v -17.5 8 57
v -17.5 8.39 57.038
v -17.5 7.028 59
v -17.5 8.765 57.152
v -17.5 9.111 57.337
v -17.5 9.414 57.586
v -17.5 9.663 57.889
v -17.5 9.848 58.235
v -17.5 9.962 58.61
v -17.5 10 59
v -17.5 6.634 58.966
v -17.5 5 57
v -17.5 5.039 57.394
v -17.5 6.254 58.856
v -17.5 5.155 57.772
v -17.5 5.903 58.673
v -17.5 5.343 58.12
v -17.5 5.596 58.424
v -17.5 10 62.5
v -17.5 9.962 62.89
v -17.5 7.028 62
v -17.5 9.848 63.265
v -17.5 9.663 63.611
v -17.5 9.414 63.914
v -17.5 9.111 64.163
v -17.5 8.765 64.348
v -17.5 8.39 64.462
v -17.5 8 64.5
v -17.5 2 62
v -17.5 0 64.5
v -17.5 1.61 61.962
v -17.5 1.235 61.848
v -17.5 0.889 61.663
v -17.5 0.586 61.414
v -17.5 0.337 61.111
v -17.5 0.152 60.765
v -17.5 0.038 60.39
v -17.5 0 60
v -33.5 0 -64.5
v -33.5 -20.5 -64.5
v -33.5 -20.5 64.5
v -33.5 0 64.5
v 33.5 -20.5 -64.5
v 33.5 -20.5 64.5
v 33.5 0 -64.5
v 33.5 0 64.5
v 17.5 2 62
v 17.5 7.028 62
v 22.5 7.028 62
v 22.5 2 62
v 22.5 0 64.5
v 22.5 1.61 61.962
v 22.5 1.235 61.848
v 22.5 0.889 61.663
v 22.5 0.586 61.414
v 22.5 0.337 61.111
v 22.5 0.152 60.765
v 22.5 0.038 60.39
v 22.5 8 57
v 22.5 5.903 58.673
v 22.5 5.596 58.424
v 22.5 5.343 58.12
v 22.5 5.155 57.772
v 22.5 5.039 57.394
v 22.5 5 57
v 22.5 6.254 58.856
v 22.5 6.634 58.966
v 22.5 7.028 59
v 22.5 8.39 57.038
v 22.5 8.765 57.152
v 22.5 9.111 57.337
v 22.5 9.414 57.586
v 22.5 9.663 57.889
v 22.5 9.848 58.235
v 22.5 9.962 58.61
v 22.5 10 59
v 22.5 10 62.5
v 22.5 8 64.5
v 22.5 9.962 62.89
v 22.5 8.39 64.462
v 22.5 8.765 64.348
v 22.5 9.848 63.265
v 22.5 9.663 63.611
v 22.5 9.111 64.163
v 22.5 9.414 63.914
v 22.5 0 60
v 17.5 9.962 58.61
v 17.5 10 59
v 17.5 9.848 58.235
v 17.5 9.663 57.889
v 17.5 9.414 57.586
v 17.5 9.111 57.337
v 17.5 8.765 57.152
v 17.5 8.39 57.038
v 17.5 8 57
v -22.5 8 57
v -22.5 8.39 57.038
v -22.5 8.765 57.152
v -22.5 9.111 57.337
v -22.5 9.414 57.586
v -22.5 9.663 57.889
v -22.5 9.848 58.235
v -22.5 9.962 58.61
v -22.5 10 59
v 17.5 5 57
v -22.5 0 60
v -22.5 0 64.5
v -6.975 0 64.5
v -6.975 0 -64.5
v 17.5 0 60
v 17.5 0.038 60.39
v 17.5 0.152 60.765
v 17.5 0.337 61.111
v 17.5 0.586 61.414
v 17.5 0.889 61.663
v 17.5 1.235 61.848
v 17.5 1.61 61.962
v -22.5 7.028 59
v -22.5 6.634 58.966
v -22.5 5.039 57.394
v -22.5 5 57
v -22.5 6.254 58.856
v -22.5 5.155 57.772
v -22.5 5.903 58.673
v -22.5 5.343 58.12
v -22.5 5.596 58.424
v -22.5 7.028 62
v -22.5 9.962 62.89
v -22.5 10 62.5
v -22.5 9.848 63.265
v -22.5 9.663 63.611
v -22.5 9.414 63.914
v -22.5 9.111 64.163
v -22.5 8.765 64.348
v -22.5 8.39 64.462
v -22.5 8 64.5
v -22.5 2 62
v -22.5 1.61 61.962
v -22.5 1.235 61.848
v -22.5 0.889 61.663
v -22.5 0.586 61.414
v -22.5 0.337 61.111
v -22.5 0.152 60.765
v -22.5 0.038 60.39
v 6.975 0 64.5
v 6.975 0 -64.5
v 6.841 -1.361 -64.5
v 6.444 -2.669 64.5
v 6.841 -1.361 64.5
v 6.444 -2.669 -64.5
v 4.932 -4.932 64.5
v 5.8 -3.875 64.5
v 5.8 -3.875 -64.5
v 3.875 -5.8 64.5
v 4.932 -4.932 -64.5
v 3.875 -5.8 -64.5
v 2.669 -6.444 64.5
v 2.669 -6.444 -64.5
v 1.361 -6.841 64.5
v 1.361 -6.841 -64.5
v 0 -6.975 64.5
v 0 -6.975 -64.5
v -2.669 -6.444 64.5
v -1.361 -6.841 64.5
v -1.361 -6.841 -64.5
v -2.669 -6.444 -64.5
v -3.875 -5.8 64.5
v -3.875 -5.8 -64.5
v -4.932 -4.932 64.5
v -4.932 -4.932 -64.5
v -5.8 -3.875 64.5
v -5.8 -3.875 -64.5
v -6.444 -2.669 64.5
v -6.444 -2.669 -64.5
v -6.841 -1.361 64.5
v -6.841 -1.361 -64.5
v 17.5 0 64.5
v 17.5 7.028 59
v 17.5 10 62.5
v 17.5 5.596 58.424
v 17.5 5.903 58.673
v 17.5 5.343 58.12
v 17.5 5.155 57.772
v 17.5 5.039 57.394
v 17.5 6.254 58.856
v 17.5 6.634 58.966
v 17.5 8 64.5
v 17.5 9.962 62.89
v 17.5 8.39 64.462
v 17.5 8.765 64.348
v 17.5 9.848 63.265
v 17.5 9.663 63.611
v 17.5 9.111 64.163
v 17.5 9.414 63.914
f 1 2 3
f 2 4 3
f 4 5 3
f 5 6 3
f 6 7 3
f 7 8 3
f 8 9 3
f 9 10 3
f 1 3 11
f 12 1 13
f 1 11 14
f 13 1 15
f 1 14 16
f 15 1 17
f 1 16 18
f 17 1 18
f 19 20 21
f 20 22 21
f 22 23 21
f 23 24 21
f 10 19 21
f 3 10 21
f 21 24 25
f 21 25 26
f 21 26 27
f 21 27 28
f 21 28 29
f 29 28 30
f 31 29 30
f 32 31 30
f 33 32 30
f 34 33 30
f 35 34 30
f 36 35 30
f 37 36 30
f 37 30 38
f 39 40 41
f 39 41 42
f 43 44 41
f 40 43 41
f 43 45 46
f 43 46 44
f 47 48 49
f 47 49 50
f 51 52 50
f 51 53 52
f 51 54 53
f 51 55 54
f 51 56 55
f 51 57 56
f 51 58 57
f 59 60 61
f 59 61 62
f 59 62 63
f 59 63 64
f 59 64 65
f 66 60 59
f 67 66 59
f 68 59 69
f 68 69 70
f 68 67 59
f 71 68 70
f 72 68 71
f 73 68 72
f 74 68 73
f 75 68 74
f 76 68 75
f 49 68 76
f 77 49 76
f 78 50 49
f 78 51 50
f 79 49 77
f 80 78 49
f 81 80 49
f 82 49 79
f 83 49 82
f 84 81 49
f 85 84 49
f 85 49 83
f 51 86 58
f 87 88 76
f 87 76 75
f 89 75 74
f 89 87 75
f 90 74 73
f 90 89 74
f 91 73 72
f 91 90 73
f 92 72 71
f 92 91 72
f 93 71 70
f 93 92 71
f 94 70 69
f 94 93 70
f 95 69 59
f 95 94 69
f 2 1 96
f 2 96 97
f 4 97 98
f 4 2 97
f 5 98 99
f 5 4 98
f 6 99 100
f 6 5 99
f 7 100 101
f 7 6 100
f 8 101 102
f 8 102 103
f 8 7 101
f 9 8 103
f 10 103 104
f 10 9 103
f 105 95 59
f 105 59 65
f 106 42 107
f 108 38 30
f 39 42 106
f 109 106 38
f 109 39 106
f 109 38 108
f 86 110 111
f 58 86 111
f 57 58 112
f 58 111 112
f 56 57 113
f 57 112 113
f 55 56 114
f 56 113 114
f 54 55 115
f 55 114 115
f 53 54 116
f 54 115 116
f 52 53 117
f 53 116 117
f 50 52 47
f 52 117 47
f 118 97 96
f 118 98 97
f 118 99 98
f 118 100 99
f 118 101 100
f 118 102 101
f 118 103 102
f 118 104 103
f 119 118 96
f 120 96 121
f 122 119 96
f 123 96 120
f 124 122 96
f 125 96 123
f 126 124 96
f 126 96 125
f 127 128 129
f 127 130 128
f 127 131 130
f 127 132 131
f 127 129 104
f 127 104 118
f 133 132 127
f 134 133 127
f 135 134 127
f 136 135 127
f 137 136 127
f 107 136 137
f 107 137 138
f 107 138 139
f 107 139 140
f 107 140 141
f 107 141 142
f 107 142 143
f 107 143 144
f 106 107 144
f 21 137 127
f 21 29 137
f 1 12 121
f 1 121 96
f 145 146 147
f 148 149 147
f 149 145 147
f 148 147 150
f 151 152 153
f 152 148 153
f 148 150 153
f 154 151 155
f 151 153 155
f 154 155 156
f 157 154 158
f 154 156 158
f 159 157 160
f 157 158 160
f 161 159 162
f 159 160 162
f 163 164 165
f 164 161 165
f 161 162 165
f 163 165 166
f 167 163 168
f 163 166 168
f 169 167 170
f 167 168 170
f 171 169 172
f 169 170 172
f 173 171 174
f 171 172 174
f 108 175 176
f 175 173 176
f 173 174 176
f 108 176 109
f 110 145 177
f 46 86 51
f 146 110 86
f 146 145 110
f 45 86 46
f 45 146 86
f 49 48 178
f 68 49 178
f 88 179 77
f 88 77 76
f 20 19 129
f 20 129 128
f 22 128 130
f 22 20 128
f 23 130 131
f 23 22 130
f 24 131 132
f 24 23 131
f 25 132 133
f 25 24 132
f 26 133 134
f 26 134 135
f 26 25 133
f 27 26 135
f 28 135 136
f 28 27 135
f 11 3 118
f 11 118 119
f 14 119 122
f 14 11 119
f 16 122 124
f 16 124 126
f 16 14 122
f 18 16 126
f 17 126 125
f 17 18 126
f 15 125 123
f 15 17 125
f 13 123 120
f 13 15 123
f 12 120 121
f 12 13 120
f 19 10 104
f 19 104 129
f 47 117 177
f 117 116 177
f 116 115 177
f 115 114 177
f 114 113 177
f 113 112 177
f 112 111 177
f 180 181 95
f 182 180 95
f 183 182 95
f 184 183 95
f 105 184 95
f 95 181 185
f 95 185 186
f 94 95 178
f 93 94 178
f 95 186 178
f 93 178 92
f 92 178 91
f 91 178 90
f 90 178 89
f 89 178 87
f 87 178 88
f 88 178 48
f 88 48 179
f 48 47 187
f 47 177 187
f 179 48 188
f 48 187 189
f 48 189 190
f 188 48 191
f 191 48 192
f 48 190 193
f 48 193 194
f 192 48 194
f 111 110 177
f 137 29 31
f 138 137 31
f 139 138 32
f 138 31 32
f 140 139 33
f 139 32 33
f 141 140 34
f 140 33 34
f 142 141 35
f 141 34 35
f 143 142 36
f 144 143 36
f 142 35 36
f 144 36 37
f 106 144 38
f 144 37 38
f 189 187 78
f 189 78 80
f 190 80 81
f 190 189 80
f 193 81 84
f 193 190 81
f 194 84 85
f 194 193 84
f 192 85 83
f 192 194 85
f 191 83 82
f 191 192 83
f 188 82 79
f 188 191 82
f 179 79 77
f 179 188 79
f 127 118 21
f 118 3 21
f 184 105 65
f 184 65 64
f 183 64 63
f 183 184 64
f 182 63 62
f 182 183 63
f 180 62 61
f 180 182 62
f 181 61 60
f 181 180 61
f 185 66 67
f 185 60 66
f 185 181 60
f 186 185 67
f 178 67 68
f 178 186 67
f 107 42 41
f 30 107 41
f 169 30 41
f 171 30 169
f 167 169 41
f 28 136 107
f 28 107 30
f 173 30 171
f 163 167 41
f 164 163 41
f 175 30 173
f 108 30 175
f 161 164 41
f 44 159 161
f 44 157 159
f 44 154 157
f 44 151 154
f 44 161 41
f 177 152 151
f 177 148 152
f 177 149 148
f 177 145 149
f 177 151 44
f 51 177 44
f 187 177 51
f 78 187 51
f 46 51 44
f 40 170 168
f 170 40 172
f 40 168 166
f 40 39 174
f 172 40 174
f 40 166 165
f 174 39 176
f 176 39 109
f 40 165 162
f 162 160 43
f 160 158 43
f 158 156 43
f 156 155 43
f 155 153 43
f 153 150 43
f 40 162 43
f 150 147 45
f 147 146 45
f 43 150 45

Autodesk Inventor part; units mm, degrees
ref_plane "XZ Plane" through (0, 0, 0) normal (0, 1, 0) x (-1, 0, 0)
ref_plane "XY Plane" through (0, 0, 0) normal (0, 0, 1) x (1, 0, 0)
sketch "Sketch1" plane through (0, 0, 0) normal (0, 0, 1) x (1, 0, 0)
  line L0 (0, 0) -> (0, 44.0101) construction
  line L1 (33.5, 0) -> (33.5, -20.5)
  line L2 (33.5, -20.5) -> (-33.5, -20.5)
  line L3 (-33.5, -20.5) -> (-33.5, 0)
  arc A0 (-6.975, 0) -> (6.975, 0) centre (0, 0) ccw
  line L4 (-33.5, 0) -> (-6.975, 0)
  line L5 (6.975, 0) -> (33.5, 0)
  dimension "d0" = 67
  dimension "d1" = 20.5
  dimension "d2" = 6.975
extrude "Extrusion1" add sketch "Sketch1" along normal mid plane 129
ref_plane "Work Plane1" through (20, 0, 0) normal (1, 0, 0) x (0, 1, 0)
sketch "Sketch2" plane through (20, 0, 0) normal (1, 0, 0) x (0, 1, 0)
  line L0 (-6.975, 64.5) -> (0, 64.5) projected
  line L1 (0, 64.5) -> (8, 64.5)
  line L2 (7.0278, 62) -> (2, 62)
  line L3 (10, 62.5) -> (10, 59)
  line L4 (8, 57) -> (5, 57)
  arc A0 (7.0278, 58.9998) -> (5, 57) centre (7, 57) ccw
  line L5 (7.0278, 62) -> (7.0278, 58.9998)
  line L6 (0, -64.5) -> (0, 64.5) projected
  arc A1 (2, 62) -> (0, 60) centre (2, 60) ccw
  arc A2 (10, 62.5) -> (8, 64.5) centre (8, 62.5) ccw
  arc A3 (8, 57) -> (10, 59) centre (8, 59) ccw
  point P0 (0, 0)
  point P1 (10, 64.5)
  point P2 (0.0278, 62)
  point P3 (10, 57)
  dimension "d6" = 10
  dimension "d8" = 2.5
  dimension "d12" = 7
  dimension "d13" = 7.5
  dimension "d14" = 5
  dimension "d15" = 2
  dimension "d16" = 2
  dimension "d19" = 2
extrude "Extrusion2" add sketch "Sketch2" along normal mid plane 5
mirror "Mirror1" about plane through (0, 0, 0) normal (1, 0, 0) of "Extrusion2"
properties part number "Laser_Pen_Housing"
